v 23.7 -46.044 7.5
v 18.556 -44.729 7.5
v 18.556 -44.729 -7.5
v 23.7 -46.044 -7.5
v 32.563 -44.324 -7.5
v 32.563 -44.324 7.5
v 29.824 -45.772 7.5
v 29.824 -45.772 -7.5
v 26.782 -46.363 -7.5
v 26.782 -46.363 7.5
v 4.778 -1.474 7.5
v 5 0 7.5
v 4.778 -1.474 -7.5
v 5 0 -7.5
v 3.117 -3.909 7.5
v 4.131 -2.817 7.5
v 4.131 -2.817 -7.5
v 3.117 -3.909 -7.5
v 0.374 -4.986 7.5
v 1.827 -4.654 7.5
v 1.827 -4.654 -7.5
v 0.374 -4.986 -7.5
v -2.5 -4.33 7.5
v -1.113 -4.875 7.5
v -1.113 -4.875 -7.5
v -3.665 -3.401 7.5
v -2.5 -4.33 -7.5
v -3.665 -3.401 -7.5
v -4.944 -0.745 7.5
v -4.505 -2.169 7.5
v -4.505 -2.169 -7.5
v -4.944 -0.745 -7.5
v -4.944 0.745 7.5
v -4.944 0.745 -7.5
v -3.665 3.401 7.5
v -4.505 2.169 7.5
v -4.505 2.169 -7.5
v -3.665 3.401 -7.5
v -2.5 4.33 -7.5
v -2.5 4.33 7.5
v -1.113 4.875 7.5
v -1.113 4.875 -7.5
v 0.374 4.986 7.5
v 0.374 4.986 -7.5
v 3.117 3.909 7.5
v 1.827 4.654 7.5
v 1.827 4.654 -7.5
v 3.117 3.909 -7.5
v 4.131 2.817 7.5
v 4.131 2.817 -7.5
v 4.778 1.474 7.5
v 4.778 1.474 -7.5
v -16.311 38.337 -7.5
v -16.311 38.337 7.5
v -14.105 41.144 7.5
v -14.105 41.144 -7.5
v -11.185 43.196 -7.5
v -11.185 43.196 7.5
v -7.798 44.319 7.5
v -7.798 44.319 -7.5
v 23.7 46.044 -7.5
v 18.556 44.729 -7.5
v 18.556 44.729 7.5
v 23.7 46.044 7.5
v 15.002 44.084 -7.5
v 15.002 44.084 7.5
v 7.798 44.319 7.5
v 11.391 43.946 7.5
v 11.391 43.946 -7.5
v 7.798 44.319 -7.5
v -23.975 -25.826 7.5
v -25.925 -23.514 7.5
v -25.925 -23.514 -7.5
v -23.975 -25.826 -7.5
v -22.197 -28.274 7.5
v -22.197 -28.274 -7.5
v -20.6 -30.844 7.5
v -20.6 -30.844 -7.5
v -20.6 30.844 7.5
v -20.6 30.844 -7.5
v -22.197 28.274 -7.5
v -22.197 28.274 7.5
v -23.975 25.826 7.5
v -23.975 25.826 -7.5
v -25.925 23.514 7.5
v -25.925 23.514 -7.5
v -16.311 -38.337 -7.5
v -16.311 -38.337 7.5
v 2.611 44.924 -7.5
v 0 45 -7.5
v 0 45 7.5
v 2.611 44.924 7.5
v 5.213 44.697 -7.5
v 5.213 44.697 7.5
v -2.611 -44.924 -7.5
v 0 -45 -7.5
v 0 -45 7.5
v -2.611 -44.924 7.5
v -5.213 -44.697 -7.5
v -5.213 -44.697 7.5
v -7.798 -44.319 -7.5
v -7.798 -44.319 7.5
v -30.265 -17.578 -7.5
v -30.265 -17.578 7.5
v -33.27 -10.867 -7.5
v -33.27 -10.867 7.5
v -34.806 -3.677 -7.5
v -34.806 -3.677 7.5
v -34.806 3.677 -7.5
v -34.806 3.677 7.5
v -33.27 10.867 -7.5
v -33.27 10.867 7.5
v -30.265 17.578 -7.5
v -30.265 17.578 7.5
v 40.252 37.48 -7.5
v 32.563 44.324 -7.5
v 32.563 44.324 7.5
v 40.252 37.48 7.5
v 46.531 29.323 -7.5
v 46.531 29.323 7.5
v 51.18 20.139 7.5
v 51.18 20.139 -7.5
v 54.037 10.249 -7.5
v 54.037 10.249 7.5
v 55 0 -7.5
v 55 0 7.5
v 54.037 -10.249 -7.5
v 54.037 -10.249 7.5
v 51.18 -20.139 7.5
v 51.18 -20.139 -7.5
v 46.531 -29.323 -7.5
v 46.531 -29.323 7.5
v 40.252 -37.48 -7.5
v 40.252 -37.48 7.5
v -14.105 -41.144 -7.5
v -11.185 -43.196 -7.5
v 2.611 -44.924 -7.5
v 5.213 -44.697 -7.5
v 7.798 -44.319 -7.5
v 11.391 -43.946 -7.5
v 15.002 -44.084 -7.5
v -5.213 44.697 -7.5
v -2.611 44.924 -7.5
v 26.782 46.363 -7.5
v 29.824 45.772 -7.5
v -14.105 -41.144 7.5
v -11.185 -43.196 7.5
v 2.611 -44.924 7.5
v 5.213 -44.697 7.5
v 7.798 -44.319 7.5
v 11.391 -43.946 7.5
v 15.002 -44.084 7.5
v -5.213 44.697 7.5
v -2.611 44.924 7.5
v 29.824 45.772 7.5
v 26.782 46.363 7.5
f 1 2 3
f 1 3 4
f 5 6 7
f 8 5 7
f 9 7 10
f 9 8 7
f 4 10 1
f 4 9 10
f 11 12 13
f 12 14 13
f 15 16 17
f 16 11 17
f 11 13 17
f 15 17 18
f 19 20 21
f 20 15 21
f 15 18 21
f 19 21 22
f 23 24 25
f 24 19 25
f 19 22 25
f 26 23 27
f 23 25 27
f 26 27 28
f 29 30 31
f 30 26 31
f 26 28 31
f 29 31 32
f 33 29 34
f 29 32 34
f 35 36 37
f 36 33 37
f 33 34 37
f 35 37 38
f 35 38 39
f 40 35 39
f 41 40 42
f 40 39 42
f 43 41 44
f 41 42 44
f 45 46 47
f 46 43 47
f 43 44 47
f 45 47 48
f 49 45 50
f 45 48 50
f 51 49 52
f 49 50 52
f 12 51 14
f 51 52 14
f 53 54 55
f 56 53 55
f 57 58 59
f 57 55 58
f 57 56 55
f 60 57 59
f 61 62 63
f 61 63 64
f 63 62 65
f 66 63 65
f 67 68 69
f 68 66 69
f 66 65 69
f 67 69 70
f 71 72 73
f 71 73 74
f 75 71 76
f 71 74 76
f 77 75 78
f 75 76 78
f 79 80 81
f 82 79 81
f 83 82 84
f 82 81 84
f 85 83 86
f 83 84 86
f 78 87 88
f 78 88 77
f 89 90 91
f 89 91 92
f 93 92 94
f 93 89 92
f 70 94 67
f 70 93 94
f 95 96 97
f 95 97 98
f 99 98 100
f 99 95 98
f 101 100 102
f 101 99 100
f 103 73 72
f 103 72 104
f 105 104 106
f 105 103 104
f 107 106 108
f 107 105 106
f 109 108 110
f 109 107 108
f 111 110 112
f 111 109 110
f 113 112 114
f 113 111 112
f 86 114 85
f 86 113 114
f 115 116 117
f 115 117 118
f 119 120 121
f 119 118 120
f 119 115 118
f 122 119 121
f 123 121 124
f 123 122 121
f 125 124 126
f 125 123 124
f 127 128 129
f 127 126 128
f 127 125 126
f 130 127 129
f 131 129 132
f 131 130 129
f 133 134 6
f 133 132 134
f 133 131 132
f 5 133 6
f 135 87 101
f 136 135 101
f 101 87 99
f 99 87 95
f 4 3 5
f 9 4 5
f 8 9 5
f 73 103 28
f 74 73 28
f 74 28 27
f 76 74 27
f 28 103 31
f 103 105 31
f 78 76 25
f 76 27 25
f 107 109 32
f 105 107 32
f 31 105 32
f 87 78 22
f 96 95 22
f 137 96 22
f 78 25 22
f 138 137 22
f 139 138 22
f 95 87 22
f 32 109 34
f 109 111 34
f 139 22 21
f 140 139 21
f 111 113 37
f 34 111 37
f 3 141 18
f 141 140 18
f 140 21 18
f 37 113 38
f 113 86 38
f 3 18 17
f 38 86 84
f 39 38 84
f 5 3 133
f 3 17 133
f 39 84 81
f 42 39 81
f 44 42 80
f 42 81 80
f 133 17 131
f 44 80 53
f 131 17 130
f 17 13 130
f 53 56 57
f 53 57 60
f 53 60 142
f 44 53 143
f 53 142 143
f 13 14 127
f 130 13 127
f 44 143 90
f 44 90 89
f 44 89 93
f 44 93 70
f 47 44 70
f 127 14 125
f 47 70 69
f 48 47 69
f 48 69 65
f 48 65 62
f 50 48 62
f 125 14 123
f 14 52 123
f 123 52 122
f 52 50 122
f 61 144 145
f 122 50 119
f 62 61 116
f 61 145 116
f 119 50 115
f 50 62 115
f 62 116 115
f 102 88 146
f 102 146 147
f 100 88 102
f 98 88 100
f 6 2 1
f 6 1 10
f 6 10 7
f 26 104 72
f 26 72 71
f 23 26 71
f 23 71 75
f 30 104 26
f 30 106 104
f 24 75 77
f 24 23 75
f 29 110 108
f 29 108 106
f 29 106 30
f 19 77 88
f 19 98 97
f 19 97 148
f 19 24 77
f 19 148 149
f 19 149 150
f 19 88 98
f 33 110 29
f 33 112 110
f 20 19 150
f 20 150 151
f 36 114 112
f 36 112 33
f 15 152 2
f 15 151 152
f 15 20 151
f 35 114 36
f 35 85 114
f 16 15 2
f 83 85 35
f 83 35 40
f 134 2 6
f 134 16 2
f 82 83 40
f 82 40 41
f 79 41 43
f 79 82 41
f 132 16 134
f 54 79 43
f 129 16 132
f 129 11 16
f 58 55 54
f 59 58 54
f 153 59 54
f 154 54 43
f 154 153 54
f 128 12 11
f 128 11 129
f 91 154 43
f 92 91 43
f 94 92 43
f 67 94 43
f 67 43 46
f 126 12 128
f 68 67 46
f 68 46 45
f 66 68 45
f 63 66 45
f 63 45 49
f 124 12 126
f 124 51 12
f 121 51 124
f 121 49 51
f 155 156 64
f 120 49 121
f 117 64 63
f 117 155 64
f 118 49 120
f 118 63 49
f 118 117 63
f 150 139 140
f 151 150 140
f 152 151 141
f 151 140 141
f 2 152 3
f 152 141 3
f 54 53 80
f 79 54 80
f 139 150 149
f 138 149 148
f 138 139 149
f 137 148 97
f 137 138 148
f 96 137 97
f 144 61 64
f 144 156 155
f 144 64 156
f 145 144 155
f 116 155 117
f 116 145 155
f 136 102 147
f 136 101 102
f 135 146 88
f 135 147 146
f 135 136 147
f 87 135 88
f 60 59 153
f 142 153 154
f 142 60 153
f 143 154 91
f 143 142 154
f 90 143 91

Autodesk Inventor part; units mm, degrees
ref_plane "YZ Plane" through (0, 0, 0) normal (1, 0, 0) x (0, 1, 0)
ref_plane "XZ Plane" through (0, 0, 0) normal (0, 1, 0) x (-1, 0, 0)
ref_plane "XY Plane" through (0, 0, 0) normal (0, 0, 1) x (1, 0, 0)
sketch "草图1" plane through (0, 0, 0) normal (0, 0, 1) x (1, 0, 0)
  line L0 (0, 0) -> (0, 45) construction
  arc A0 (7.7977, 44.3192) -> (0, 45) centre (0, 0) ccw
  line L1 (0, 0) -> (13.1567, 43.0337) construction
  line L2 (0, 0) -> (0, 45) construction
  arc A1 (32.563, -44.3244) -> (32.563, 44.3244) centre (0, 0) ccw
  line L3 (0, 0) -> (16.0804, -52.5968) construction
  line L4 (0, 0) -> (16.0804, 52.5968) construction
  arc A2 (0, -45) -> (7.7977, -44.3192) centre (0, 0) ccw
  arc A3 (0, 45) -> (-7.7977, 44.3192) centre (0, 0) ccw
  arc A4 (-7.7977, -44.3192) -> (0, -45) centre (0, 0) ccw
  line L5 (0, 0) -> (45, 0) construction
  arc A5 (7.7977, 44.3192) -> (18.5563, 44.729) centre (12.2262, 69.489) ccw
  arc A6 (32.563, 44.3244) -> (23.7003, 46.0441) centre (26.3144, 35.8188) ccw
  line L6 (18.5563, 44.729) -> (23.7003, 46.0441)
  arc A7 (18.5563, -44.729) -> (7.7977, -44.3192) centre (12.2262, -69.489) ccw
  arc A8 (23.7003, -46.0441) -> (32.563, -44.3244) centre (26.3144, -35.8188) ccw
  line L7 (18.5563, -44.729) -> (23.7003, -46.0441)
  line L8 (0, 0) -> (-13.1567, 43.0337) construction
  line L9 (0, 0) -> (-13.1567, -43.0337) construction
  arc A9 (-25.925, 23.5137) -> (-25.925, -23.5137) centre (0, 0) ccw
  arc A10 (-7.7977, 44.3192) -> (-16.3105, 38.3374) centre (-5.674, 32.2489) ccw
  arc A11 (-25.925, 23.5137) -> (-20.6001, 30.8435) centre (-56.9437, 51.6471) ccw
  line L10 (-16.3105, 38.3374) -> (-20.6001, 30.8435)
  arc A12 (-16.3105, -38.3374) -> (-7.7977, -44.3192) centre (-5.674, -32.2489) ccw
  arc A13 (-20.6001, -30.8435) -> (-25.925, -23.5137) centre (-56.9437, -51.6471) ccw
  line L11 (-16.3105, -38.3374) -> (-20.6001, -30.8435)
  arc A14 (-7.7977, -44.3192) -> (7.7977, -44.3192) centre (0, 0) ccw construction
  arc A15 (13.1567, -43.0337) -> (-13.1567, -43.0337) centre (0, 0) ccw construction
  circle A16 centre (0, 0) radius 5
  dimension "d43" = 17
  dimension "d45" = 55
  dimension "d46" = 146
  dimension "d49" = 25.5563
  dimension "d50" = 5.3094
  dimension "d51" = 10.5541
  dimension "d52" = 17
  dimension "d53" = 34
  dimension "d54" = 35
  dimension "d55" = 12.2558
  dimension "d56" = 8.6348
  dimension "d57" = 41.8766
  dimension "凸轮孔直径" = 10
extrude "拉伸3" add sketch "草图1" along normal mid plane 15
properties part number "重要"
